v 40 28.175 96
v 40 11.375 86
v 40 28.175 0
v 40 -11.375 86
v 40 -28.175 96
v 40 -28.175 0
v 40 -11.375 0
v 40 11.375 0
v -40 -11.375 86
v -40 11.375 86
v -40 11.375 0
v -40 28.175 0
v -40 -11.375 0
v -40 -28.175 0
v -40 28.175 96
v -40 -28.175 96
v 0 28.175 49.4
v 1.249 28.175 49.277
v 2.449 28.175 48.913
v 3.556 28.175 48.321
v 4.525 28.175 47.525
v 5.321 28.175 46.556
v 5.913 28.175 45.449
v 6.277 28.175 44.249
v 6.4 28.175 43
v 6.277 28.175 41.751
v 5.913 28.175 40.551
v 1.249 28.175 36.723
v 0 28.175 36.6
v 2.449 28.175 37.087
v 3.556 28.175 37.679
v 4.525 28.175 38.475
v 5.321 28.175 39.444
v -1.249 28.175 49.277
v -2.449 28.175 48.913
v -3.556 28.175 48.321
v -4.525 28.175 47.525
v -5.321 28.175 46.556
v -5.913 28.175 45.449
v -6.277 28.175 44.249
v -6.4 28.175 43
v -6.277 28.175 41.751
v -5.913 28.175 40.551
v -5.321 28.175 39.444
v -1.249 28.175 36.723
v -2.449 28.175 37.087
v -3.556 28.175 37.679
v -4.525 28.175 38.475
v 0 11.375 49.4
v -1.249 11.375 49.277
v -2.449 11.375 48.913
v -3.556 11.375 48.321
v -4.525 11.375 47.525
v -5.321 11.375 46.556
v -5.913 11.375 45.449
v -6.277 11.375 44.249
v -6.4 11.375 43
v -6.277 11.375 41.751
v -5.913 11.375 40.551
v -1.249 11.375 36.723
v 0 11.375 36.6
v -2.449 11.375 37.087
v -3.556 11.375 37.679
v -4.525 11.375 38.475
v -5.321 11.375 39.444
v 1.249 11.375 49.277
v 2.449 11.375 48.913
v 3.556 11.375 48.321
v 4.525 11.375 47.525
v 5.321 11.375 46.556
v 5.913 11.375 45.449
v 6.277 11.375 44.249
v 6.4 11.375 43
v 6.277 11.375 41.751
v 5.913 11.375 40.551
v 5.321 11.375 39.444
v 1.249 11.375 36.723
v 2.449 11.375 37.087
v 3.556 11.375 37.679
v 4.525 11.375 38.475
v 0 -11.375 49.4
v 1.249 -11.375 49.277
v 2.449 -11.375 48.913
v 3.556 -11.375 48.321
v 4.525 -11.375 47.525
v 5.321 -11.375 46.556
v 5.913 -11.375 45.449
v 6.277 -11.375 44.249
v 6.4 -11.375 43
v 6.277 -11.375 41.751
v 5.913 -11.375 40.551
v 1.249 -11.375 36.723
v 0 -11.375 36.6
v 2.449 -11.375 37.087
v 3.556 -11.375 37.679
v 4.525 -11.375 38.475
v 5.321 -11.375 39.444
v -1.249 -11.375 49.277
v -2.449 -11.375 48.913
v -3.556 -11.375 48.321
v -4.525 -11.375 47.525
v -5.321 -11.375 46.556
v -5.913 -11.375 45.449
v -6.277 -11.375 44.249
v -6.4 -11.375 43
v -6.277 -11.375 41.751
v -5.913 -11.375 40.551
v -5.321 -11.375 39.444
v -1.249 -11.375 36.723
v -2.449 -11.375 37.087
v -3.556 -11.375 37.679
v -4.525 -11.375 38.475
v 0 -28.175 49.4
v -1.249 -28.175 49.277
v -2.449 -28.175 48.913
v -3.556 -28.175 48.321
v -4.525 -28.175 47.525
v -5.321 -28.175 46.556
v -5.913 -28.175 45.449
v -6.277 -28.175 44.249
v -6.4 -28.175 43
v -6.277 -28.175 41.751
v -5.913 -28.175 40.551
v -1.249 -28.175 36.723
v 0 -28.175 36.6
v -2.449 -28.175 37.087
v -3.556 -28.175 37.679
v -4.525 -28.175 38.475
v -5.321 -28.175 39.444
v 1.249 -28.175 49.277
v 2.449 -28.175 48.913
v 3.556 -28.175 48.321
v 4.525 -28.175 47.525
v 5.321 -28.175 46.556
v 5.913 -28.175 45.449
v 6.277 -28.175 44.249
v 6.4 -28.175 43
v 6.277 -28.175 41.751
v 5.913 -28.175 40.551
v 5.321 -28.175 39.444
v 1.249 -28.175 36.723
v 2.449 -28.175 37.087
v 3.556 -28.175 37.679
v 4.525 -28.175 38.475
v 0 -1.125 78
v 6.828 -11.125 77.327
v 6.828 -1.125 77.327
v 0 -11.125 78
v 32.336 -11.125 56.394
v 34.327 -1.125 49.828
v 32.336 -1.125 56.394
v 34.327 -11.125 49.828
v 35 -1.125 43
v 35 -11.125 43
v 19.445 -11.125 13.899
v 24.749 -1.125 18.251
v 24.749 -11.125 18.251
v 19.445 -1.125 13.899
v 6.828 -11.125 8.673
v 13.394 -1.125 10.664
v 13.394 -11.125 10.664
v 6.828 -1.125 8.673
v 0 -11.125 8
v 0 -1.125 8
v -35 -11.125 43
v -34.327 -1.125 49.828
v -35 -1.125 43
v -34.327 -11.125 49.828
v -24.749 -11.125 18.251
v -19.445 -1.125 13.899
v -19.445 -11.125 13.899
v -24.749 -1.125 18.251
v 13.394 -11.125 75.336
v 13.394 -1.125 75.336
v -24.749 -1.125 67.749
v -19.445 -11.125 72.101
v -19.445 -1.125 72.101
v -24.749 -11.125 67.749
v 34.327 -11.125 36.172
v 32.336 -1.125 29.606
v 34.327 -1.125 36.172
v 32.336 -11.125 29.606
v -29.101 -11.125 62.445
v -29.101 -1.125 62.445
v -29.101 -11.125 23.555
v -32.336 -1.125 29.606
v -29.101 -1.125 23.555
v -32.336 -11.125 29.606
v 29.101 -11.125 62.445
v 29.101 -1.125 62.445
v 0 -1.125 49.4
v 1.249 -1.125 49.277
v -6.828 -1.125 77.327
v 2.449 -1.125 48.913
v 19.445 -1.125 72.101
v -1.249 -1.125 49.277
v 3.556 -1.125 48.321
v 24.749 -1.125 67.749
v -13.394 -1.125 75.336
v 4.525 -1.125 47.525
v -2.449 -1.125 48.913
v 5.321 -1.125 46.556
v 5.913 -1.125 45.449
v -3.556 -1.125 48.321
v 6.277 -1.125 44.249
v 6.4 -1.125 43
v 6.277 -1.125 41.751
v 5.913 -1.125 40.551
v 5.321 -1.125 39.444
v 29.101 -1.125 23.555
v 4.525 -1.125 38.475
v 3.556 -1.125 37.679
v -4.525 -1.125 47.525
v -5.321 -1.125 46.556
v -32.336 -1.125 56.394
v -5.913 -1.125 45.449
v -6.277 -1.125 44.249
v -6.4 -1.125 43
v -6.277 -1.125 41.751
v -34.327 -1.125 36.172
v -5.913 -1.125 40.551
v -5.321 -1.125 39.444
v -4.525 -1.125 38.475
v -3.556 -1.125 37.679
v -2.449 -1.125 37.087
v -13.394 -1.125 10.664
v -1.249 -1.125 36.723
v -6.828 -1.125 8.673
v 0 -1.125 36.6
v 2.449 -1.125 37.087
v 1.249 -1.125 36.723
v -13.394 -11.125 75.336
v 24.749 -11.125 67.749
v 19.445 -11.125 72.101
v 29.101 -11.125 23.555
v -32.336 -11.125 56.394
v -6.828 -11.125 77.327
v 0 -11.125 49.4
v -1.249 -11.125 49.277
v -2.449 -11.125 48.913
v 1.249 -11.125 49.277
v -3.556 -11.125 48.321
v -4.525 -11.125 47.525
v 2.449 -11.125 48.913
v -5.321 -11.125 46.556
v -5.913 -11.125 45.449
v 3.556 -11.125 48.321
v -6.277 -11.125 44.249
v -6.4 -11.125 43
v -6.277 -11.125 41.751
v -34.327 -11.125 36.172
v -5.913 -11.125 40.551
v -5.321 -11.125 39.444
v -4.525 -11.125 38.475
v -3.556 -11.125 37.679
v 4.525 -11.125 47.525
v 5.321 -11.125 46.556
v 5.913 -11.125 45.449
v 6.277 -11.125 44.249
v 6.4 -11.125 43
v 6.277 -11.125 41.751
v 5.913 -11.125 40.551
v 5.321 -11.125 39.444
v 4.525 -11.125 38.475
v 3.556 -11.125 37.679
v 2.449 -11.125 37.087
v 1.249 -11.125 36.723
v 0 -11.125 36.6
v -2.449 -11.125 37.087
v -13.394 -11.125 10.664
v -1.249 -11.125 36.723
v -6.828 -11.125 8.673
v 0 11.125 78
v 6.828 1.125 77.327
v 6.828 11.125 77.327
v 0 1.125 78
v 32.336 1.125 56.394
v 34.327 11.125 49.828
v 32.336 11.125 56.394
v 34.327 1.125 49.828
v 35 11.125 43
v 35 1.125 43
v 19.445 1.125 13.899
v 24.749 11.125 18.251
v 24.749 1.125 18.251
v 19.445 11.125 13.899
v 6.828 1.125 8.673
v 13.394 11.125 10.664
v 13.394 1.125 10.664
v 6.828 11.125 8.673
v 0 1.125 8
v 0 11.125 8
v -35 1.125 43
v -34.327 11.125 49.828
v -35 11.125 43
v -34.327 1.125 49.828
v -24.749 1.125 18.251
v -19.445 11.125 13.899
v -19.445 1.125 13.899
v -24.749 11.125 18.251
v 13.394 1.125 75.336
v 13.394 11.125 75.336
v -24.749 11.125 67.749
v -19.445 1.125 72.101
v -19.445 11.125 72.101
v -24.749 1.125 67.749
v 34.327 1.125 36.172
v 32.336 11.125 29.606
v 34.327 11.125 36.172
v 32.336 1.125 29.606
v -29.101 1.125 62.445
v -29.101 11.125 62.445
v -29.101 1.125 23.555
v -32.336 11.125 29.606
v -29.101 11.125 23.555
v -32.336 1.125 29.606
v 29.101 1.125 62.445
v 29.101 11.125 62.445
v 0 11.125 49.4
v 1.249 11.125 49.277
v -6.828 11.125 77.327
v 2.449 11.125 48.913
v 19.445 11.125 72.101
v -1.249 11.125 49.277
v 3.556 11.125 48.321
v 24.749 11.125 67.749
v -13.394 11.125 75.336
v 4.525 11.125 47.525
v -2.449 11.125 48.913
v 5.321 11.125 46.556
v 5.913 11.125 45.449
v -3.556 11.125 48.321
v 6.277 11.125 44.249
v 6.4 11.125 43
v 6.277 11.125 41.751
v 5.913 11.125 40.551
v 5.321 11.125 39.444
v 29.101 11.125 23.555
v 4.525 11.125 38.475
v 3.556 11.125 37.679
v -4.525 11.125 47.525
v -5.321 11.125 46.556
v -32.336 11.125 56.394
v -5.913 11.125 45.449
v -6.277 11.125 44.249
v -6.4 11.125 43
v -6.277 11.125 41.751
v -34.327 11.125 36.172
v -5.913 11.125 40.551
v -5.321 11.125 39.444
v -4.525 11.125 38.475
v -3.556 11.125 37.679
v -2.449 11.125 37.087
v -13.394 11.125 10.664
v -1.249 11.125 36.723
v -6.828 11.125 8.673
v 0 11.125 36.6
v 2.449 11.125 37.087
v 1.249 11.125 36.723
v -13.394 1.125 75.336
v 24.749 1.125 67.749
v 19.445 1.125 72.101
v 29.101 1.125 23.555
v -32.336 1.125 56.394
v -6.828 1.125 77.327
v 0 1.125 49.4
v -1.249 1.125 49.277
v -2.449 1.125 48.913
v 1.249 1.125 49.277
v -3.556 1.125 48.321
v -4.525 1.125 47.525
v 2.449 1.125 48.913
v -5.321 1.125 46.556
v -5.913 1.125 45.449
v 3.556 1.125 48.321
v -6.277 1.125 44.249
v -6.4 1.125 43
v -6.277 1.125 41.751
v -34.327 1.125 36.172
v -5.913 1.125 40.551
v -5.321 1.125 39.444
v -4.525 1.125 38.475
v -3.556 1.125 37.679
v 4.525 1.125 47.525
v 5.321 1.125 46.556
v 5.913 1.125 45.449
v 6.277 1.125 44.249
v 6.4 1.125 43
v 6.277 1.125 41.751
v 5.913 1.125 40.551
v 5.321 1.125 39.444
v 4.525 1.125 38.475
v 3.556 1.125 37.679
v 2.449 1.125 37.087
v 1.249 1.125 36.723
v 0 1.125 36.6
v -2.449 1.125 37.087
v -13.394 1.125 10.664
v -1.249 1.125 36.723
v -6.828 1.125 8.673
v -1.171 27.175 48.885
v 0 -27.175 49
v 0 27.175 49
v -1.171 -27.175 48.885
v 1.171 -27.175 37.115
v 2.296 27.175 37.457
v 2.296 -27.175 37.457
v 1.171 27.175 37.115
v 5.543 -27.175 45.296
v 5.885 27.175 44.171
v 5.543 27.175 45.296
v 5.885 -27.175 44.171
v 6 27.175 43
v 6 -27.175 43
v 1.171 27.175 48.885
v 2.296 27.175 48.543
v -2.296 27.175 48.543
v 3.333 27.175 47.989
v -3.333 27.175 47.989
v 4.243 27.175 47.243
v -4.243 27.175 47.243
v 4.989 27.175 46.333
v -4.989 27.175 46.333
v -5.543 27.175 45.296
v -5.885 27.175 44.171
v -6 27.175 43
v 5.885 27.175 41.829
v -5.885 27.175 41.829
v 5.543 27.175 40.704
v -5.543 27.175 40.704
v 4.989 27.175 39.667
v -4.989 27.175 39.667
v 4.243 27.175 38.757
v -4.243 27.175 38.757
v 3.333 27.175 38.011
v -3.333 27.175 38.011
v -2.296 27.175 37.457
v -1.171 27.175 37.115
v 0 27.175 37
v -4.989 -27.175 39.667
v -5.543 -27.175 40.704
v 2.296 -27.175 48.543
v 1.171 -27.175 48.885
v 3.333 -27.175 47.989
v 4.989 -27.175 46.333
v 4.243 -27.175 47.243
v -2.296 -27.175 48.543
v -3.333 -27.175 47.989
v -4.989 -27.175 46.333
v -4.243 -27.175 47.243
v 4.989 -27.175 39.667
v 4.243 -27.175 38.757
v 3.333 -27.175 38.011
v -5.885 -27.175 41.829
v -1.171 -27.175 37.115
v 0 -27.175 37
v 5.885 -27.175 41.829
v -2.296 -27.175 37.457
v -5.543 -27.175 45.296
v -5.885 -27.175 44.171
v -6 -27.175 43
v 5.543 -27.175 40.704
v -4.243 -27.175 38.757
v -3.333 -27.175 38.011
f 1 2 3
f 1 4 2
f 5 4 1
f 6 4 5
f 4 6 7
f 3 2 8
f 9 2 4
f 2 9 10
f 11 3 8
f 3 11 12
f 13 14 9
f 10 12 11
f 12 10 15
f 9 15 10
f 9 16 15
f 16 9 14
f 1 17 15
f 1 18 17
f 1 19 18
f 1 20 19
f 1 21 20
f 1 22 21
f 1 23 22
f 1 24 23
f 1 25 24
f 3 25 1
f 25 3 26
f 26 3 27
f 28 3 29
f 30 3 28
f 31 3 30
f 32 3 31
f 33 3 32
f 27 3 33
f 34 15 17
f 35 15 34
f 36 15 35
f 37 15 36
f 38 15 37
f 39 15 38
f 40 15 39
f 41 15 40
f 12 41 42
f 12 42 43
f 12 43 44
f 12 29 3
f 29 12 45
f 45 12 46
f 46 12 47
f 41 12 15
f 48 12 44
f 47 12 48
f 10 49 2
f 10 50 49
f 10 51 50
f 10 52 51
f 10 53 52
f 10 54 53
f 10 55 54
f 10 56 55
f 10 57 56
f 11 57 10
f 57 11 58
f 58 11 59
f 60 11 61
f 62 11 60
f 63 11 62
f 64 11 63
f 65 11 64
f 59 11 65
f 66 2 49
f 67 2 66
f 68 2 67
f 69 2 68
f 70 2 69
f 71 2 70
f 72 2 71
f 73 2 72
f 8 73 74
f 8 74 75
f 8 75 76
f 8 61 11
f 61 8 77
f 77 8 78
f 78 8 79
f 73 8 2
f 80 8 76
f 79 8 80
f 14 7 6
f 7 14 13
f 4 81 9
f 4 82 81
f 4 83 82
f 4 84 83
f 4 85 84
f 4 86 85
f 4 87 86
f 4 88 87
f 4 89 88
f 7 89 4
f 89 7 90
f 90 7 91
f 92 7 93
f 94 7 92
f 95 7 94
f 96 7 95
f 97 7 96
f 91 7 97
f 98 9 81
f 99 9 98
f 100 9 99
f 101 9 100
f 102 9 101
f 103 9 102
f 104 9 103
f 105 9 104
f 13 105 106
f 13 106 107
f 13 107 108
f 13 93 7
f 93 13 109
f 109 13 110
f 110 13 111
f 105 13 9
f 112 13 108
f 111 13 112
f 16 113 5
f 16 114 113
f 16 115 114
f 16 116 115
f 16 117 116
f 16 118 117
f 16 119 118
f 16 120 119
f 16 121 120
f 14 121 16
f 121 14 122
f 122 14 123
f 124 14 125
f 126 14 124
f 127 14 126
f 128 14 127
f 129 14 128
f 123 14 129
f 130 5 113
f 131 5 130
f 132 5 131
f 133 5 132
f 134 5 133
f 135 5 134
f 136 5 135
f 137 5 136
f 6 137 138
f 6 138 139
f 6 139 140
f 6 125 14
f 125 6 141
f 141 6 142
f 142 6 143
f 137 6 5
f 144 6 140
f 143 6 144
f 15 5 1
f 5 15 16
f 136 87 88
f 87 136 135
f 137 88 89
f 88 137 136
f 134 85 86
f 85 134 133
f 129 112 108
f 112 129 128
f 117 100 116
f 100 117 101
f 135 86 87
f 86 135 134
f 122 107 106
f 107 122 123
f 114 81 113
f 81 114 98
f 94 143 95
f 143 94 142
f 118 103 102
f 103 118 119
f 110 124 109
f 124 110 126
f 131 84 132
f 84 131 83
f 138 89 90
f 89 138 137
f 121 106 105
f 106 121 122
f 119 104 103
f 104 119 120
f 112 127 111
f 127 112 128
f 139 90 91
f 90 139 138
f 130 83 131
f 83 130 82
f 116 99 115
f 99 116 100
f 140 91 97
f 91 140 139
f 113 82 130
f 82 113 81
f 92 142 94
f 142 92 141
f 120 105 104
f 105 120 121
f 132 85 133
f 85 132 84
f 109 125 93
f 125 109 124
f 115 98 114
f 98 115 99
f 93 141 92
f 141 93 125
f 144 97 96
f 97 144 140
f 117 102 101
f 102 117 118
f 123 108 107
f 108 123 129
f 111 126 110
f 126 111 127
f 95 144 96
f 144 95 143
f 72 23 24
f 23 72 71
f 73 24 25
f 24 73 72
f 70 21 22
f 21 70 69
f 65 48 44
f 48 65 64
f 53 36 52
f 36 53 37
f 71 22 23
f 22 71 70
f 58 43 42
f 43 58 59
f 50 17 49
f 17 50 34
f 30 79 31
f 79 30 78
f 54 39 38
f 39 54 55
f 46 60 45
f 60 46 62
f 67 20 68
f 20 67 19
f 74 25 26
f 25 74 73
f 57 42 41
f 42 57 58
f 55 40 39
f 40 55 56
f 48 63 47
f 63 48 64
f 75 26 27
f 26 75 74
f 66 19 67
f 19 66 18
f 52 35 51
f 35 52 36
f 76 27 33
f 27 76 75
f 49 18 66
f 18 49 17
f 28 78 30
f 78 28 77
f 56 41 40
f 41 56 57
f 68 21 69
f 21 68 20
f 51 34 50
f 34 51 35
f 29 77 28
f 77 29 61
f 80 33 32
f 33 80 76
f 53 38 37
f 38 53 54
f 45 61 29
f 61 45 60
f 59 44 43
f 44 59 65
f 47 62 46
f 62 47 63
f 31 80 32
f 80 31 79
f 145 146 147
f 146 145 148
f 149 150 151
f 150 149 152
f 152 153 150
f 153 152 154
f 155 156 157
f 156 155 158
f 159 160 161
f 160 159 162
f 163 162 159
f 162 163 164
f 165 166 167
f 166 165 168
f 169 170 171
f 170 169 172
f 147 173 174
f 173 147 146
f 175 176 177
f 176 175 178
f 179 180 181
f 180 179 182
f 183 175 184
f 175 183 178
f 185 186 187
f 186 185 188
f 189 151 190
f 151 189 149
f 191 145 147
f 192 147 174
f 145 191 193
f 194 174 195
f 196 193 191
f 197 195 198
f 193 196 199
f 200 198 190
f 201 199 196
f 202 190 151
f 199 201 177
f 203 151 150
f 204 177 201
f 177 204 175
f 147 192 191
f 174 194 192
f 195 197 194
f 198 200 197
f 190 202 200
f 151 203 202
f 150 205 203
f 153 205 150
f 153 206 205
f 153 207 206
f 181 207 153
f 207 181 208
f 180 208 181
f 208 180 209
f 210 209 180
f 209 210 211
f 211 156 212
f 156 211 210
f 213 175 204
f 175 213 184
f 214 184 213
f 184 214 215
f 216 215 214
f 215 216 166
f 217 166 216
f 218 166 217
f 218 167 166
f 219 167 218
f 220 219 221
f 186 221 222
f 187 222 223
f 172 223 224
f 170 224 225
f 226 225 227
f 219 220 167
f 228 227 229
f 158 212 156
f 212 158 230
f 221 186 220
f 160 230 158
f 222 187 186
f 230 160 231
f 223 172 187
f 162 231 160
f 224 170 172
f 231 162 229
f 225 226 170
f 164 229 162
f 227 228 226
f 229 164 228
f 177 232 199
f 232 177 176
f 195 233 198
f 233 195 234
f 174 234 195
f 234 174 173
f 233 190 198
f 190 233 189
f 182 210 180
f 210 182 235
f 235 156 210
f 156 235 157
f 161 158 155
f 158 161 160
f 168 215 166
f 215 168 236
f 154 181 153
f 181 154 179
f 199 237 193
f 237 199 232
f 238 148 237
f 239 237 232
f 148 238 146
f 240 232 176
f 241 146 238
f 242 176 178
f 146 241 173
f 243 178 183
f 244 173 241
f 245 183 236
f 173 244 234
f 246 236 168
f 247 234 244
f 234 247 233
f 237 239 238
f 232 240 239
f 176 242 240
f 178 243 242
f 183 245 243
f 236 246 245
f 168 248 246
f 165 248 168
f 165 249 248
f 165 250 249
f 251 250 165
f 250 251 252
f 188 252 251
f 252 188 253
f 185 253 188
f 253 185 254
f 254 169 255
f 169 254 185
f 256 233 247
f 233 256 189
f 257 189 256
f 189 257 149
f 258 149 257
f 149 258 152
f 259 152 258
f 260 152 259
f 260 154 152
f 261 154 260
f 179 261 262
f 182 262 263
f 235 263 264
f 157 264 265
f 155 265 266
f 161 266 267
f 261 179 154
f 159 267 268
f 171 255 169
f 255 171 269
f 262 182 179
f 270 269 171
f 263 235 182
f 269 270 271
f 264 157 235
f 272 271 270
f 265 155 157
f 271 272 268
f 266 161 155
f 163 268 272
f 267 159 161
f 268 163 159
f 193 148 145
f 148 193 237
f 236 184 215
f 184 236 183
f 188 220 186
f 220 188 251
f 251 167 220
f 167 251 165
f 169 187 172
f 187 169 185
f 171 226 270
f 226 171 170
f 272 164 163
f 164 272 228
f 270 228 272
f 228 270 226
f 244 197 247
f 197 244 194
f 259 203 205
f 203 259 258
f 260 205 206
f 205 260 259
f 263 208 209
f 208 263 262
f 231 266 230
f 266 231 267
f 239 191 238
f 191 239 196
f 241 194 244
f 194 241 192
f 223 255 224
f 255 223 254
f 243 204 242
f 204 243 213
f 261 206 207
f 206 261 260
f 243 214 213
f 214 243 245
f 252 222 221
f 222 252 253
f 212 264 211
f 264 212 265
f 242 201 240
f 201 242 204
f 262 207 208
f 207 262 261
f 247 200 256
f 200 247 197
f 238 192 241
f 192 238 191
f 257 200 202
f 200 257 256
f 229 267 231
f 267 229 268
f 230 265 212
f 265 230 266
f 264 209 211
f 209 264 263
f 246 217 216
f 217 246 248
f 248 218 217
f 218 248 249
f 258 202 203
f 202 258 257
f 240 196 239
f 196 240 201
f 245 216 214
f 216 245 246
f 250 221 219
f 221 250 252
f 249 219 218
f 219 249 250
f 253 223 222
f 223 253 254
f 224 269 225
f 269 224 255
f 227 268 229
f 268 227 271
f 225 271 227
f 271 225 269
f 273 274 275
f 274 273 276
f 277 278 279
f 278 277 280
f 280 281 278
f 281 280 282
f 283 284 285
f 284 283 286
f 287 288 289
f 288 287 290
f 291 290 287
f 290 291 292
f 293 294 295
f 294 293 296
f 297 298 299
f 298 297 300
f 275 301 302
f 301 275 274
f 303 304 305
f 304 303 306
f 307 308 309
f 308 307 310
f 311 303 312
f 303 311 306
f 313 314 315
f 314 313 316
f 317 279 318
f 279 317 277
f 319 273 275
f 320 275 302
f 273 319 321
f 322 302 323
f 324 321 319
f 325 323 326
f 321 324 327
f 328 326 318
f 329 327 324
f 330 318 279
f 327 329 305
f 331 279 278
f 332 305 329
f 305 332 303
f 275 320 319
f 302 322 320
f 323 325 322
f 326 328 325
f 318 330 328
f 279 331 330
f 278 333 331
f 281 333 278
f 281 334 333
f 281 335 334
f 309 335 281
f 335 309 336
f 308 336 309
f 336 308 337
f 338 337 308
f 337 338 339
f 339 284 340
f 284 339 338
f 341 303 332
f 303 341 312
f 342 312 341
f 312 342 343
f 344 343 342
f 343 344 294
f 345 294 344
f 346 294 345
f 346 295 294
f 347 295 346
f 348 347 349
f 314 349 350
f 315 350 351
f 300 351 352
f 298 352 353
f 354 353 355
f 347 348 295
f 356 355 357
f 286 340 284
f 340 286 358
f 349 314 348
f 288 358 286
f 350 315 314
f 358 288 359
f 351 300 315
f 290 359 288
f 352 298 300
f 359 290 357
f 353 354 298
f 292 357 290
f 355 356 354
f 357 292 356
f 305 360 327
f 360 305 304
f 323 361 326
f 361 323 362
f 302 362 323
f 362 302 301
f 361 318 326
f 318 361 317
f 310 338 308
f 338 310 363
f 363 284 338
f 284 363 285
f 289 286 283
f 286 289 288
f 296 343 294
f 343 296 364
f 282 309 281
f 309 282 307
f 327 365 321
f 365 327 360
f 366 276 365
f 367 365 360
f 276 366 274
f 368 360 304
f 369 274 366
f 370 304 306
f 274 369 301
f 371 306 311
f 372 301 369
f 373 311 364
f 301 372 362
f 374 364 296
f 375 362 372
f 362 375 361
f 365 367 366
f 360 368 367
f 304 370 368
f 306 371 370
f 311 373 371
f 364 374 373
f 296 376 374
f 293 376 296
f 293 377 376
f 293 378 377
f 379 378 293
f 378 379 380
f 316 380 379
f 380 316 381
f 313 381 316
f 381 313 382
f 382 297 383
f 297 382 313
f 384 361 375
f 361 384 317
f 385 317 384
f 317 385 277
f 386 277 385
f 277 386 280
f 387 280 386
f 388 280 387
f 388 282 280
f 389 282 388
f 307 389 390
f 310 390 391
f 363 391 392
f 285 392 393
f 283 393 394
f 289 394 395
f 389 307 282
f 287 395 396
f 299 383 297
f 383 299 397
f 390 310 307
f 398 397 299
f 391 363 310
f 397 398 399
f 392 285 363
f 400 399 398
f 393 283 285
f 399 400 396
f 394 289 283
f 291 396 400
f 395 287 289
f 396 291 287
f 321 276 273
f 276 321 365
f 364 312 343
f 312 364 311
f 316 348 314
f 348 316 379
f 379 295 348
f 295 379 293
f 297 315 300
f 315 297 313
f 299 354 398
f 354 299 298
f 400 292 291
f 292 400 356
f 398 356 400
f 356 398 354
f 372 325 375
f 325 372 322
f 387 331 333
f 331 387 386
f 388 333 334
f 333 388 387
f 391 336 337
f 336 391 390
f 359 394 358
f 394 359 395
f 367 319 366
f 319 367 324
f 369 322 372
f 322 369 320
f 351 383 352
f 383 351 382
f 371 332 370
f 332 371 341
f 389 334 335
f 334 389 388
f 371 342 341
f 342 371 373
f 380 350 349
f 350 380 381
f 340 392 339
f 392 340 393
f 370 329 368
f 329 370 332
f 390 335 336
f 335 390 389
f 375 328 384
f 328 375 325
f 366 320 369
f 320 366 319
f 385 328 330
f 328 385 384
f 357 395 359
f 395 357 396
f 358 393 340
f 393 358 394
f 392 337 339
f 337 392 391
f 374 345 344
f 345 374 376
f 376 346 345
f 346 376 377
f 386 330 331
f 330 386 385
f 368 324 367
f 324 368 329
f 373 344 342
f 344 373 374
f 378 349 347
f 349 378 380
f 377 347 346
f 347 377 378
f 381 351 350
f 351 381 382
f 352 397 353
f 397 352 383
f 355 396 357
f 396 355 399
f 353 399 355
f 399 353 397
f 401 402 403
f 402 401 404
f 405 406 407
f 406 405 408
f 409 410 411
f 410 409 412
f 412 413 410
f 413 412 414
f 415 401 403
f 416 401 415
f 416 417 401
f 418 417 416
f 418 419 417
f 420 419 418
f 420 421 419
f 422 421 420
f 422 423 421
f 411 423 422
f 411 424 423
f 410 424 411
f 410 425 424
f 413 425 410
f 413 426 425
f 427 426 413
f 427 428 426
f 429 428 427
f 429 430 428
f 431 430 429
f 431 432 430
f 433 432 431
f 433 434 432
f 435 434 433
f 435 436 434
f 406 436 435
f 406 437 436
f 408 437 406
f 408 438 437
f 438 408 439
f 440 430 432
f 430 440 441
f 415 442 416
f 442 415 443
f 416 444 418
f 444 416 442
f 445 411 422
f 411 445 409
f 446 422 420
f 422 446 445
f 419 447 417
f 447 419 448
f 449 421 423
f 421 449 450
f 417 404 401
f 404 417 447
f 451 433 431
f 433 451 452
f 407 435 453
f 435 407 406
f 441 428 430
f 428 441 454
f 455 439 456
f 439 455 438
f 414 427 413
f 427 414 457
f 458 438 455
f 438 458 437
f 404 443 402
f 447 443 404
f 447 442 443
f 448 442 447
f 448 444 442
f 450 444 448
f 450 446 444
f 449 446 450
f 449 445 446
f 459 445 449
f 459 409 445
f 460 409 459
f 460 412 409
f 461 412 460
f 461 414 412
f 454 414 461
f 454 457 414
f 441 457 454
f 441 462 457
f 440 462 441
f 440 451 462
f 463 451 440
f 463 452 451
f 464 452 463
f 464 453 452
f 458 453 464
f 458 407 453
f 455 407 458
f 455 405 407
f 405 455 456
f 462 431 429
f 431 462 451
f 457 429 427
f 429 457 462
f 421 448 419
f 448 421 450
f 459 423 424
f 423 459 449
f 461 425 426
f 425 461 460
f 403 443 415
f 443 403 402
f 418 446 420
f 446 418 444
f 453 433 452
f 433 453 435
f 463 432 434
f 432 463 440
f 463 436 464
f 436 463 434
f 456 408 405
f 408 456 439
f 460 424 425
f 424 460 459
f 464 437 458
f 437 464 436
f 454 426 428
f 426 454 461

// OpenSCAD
$fn = 32;

// ------------------------------------------------------------------------
// Trolley wheel set: wheels d70, fork 86 mm tall
// Every part is its own module, assembly() places every instance.
// ------------------------------------------------------------------------

// --- part 1 ---
module trolley_fork() {
  difference() {
    union() {
      translate([-40, 11.375, 0]) cube([80, 16.8, 86]);
      translate([-40, -28.175, 0]) cube([80, 16.8, 86]);
      translate([-40, -28.175, 86]) cube([80, 56.35, 10]);
    }
    translate([0, -19.775, 43]) rotate([90, 0, 0]) cylinder(h = 18.8, d = 12.8, center = true);
    translate([0, 19.775, 43]) rotate([90, 0, 0]) cylinder(h = 18.8, d = 12.8, center = true);
  }
}

// --- part 2 ---
module trolley_wheel() {
  difference() {
      translate([0, 0, 0]) cylinder(h = 10, d = 70);
      translate([0, 0, -1]) cylinder(h = 12, d = 12.8);
    }
}

// --- part 3 ---
module trolley_axle() {
  translate([0, 0, -27.175]) cylinder(h = 54.35, d = 12);
}

// --- assembly ---
module assembly() {
  color([0.80, 0.24, 0.20]) translate([0, 0, 0]) rotate([0, 0, 0]) trolley_fork();
  color([0.20, 0.45, 0.75]) translate([0, -1.125, 43]) rotate([90, 0, 0]) trolley_wheel();
  color([0.25, 0.62, 0.32]) translate([0, 11.125, 43]) rotate([90, 0, 0]) trolley_wheel();
  color([0.92, 0.70, 0.18]) translate([0, 0, 43]) rotate([90, 0, 0]) trolley_axle();
}

assembly();
